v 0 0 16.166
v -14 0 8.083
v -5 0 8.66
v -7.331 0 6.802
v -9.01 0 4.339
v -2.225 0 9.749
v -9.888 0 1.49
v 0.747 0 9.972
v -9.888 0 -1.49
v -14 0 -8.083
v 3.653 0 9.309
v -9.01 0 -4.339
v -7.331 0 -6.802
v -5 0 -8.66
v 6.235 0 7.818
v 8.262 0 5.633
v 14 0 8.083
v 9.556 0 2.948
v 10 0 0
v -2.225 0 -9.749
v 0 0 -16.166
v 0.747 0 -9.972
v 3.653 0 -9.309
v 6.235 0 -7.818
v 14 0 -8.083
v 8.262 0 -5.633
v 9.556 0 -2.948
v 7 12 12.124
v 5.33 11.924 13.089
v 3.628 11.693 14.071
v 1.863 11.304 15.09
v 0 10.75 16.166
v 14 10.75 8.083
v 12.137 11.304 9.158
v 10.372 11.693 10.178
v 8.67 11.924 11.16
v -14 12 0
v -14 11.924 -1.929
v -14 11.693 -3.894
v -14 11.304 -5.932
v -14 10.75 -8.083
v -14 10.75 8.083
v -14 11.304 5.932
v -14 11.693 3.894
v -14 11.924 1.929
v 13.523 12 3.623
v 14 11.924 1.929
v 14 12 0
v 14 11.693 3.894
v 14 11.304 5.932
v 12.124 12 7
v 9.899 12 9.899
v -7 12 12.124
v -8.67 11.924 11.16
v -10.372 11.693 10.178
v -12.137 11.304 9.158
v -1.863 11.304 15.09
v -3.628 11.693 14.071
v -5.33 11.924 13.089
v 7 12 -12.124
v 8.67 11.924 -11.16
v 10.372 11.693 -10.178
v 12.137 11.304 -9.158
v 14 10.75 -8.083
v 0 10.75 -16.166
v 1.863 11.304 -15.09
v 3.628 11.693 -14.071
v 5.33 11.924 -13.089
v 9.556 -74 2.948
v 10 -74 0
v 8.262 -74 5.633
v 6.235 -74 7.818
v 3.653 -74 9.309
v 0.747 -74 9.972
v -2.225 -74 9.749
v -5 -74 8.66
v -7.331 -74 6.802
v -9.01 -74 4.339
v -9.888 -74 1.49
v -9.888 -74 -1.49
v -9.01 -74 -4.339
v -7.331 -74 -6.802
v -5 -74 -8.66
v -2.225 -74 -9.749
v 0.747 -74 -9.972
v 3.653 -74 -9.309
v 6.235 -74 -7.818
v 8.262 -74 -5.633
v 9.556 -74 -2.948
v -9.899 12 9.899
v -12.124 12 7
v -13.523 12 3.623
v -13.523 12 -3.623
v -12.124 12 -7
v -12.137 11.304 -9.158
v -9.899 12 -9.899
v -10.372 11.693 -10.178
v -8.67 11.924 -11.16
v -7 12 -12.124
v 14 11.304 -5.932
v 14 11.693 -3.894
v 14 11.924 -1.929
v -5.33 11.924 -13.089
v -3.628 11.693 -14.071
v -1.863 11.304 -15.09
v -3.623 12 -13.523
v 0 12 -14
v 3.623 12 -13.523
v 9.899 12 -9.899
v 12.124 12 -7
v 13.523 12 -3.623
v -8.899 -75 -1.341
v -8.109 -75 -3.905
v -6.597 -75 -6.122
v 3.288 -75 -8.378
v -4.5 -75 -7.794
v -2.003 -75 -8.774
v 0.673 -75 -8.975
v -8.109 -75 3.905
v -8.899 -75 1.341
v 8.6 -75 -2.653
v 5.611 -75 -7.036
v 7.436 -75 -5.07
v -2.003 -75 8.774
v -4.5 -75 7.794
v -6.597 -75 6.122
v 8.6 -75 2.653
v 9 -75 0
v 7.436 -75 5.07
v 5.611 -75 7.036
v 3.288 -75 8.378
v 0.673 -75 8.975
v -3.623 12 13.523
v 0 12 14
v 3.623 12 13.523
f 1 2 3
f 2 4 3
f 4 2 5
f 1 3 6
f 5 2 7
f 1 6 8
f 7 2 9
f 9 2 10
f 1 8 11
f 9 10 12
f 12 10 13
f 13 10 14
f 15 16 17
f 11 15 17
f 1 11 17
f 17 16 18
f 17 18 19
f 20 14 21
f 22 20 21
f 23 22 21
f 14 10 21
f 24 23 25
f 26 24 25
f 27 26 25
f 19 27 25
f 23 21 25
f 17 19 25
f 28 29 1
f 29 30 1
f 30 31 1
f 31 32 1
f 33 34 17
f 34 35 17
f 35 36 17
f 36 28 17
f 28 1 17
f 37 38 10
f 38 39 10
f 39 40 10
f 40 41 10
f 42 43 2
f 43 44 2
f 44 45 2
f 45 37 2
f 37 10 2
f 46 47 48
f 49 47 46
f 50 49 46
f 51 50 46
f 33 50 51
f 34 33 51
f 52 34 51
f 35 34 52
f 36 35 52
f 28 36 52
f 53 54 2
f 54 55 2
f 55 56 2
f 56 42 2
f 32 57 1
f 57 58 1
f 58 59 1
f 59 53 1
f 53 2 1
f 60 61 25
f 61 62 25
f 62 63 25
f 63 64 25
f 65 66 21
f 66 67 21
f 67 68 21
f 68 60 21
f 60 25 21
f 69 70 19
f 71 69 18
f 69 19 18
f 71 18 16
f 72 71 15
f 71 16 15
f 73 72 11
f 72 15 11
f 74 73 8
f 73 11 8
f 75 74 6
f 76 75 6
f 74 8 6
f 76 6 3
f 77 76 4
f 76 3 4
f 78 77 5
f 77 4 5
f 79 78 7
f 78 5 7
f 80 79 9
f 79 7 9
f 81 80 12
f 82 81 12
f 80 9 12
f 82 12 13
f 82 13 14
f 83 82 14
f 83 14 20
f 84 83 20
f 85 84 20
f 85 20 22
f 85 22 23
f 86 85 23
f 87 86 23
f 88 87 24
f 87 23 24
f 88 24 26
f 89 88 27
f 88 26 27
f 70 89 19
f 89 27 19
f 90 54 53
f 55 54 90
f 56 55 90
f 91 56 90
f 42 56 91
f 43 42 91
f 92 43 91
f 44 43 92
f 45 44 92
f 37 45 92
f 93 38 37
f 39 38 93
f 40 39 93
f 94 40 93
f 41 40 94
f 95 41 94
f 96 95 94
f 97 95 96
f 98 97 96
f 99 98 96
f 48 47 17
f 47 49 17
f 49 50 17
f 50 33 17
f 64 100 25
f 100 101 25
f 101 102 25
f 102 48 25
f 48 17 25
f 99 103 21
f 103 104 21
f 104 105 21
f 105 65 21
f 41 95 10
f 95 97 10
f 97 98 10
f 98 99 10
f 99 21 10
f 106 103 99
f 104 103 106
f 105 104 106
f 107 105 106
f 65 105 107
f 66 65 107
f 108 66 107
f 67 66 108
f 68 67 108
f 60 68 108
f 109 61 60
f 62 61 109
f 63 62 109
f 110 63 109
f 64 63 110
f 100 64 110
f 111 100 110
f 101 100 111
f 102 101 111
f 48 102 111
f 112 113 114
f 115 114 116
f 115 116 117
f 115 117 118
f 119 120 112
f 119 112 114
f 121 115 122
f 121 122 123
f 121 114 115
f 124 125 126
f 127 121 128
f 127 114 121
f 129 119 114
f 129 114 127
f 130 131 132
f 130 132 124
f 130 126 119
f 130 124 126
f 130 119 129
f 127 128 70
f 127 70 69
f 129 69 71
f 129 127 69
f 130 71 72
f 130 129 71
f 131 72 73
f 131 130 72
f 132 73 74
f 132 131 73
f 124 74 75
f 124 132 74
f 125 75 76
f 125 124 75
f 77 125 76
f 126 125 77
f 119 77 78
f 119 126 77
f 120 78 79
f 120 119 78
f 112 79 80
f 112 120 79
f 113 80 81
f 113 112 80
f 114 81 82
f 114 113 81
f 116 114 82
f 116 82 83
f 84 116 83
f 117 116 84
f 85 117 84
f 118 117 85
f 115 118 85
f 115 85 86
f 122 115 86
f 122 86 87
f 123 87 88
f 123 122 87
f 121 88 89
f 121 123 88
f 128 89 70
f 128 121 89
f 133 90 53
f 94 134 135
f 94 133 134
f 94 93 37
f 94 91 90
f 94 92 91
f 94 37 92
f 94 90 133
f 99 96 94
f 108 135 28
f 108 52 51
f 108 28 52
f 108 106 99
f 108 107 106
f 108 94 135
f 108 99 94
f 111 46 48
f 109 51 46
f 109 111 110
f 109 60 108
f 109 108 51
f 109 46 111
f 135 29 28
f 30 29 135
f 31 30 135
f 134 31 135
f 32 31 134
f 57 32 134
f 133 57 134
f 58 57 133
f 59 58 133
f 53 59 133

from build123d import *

# Parameters (mm, degrees)
BOSS_EXTRUDE1_DEPTH = 12
SKETCH2_OUTSIDE_W   = 80.454
SKETCH2_OUTSIDE_H   = 84.786
SKETCH2_OUTSIDE_R   = 14
CUT_EXTRUDE1_DEPTH  = 12
CUT_EXTRUDE1_TAPER  = 60
SKETCH3_R           = 10
BOSS_EXTRUDE2_DEPTH = 75
CHAMFER1_SIZE       = 1


with BuildPart() as part:
    # Sketch1 → Boss-Extrude1 (new body)
    with BuildSketch(Plane(origin=(0, 0, 0), x_dir=(1, 0, 0), z_dir=(0, 1, 0))):
        Polygon((0, -16.165807537), (14, -8.082903769), (14, 8.082903769), (0, 16.165807537), (-14, 8.082903769), (-14, -8.082903769), align=None)
    extrude(amount=BOSS_EXTRUDE1_DEPTH)

    # Sketch2 outside → Cut-Extrude1 (cut)
    with BuildSketch(Plane(origin=(0, 12, 0), x_dir=(1, 0, 0), z_dir=(0, 1, 0))):
        Rectangle(SKETCH2_OUTSIDE_W, SKETCH2_OUTSIDE_H)
        Circle(SKETCH2_OUTSIDE_R, mode=Mode.SUBTRACT)
    extrude(amount=-CUT_EXTRUDE1_DEPTH, taper=CUT_EXTRUDE1_TAPER, mode=Mode.SUBTRACT)

    # Sketch3 → Boss-Extrude2 (add)
    with BuildSketch(Plane.XZ):
        Circle(SKETCH3_R)
    extrude(amount=BOSS_EXTRUDE2_DEPTH)

    # Chamfer1
    chamfer1_edges = [part.edges().sort_by_distance(p)[0] for p in [
        (-10, -75, 0),
    ]]
    chamfer(chamfer1_edges, length=CHAMFER1_SIZE)


solid = part.part
